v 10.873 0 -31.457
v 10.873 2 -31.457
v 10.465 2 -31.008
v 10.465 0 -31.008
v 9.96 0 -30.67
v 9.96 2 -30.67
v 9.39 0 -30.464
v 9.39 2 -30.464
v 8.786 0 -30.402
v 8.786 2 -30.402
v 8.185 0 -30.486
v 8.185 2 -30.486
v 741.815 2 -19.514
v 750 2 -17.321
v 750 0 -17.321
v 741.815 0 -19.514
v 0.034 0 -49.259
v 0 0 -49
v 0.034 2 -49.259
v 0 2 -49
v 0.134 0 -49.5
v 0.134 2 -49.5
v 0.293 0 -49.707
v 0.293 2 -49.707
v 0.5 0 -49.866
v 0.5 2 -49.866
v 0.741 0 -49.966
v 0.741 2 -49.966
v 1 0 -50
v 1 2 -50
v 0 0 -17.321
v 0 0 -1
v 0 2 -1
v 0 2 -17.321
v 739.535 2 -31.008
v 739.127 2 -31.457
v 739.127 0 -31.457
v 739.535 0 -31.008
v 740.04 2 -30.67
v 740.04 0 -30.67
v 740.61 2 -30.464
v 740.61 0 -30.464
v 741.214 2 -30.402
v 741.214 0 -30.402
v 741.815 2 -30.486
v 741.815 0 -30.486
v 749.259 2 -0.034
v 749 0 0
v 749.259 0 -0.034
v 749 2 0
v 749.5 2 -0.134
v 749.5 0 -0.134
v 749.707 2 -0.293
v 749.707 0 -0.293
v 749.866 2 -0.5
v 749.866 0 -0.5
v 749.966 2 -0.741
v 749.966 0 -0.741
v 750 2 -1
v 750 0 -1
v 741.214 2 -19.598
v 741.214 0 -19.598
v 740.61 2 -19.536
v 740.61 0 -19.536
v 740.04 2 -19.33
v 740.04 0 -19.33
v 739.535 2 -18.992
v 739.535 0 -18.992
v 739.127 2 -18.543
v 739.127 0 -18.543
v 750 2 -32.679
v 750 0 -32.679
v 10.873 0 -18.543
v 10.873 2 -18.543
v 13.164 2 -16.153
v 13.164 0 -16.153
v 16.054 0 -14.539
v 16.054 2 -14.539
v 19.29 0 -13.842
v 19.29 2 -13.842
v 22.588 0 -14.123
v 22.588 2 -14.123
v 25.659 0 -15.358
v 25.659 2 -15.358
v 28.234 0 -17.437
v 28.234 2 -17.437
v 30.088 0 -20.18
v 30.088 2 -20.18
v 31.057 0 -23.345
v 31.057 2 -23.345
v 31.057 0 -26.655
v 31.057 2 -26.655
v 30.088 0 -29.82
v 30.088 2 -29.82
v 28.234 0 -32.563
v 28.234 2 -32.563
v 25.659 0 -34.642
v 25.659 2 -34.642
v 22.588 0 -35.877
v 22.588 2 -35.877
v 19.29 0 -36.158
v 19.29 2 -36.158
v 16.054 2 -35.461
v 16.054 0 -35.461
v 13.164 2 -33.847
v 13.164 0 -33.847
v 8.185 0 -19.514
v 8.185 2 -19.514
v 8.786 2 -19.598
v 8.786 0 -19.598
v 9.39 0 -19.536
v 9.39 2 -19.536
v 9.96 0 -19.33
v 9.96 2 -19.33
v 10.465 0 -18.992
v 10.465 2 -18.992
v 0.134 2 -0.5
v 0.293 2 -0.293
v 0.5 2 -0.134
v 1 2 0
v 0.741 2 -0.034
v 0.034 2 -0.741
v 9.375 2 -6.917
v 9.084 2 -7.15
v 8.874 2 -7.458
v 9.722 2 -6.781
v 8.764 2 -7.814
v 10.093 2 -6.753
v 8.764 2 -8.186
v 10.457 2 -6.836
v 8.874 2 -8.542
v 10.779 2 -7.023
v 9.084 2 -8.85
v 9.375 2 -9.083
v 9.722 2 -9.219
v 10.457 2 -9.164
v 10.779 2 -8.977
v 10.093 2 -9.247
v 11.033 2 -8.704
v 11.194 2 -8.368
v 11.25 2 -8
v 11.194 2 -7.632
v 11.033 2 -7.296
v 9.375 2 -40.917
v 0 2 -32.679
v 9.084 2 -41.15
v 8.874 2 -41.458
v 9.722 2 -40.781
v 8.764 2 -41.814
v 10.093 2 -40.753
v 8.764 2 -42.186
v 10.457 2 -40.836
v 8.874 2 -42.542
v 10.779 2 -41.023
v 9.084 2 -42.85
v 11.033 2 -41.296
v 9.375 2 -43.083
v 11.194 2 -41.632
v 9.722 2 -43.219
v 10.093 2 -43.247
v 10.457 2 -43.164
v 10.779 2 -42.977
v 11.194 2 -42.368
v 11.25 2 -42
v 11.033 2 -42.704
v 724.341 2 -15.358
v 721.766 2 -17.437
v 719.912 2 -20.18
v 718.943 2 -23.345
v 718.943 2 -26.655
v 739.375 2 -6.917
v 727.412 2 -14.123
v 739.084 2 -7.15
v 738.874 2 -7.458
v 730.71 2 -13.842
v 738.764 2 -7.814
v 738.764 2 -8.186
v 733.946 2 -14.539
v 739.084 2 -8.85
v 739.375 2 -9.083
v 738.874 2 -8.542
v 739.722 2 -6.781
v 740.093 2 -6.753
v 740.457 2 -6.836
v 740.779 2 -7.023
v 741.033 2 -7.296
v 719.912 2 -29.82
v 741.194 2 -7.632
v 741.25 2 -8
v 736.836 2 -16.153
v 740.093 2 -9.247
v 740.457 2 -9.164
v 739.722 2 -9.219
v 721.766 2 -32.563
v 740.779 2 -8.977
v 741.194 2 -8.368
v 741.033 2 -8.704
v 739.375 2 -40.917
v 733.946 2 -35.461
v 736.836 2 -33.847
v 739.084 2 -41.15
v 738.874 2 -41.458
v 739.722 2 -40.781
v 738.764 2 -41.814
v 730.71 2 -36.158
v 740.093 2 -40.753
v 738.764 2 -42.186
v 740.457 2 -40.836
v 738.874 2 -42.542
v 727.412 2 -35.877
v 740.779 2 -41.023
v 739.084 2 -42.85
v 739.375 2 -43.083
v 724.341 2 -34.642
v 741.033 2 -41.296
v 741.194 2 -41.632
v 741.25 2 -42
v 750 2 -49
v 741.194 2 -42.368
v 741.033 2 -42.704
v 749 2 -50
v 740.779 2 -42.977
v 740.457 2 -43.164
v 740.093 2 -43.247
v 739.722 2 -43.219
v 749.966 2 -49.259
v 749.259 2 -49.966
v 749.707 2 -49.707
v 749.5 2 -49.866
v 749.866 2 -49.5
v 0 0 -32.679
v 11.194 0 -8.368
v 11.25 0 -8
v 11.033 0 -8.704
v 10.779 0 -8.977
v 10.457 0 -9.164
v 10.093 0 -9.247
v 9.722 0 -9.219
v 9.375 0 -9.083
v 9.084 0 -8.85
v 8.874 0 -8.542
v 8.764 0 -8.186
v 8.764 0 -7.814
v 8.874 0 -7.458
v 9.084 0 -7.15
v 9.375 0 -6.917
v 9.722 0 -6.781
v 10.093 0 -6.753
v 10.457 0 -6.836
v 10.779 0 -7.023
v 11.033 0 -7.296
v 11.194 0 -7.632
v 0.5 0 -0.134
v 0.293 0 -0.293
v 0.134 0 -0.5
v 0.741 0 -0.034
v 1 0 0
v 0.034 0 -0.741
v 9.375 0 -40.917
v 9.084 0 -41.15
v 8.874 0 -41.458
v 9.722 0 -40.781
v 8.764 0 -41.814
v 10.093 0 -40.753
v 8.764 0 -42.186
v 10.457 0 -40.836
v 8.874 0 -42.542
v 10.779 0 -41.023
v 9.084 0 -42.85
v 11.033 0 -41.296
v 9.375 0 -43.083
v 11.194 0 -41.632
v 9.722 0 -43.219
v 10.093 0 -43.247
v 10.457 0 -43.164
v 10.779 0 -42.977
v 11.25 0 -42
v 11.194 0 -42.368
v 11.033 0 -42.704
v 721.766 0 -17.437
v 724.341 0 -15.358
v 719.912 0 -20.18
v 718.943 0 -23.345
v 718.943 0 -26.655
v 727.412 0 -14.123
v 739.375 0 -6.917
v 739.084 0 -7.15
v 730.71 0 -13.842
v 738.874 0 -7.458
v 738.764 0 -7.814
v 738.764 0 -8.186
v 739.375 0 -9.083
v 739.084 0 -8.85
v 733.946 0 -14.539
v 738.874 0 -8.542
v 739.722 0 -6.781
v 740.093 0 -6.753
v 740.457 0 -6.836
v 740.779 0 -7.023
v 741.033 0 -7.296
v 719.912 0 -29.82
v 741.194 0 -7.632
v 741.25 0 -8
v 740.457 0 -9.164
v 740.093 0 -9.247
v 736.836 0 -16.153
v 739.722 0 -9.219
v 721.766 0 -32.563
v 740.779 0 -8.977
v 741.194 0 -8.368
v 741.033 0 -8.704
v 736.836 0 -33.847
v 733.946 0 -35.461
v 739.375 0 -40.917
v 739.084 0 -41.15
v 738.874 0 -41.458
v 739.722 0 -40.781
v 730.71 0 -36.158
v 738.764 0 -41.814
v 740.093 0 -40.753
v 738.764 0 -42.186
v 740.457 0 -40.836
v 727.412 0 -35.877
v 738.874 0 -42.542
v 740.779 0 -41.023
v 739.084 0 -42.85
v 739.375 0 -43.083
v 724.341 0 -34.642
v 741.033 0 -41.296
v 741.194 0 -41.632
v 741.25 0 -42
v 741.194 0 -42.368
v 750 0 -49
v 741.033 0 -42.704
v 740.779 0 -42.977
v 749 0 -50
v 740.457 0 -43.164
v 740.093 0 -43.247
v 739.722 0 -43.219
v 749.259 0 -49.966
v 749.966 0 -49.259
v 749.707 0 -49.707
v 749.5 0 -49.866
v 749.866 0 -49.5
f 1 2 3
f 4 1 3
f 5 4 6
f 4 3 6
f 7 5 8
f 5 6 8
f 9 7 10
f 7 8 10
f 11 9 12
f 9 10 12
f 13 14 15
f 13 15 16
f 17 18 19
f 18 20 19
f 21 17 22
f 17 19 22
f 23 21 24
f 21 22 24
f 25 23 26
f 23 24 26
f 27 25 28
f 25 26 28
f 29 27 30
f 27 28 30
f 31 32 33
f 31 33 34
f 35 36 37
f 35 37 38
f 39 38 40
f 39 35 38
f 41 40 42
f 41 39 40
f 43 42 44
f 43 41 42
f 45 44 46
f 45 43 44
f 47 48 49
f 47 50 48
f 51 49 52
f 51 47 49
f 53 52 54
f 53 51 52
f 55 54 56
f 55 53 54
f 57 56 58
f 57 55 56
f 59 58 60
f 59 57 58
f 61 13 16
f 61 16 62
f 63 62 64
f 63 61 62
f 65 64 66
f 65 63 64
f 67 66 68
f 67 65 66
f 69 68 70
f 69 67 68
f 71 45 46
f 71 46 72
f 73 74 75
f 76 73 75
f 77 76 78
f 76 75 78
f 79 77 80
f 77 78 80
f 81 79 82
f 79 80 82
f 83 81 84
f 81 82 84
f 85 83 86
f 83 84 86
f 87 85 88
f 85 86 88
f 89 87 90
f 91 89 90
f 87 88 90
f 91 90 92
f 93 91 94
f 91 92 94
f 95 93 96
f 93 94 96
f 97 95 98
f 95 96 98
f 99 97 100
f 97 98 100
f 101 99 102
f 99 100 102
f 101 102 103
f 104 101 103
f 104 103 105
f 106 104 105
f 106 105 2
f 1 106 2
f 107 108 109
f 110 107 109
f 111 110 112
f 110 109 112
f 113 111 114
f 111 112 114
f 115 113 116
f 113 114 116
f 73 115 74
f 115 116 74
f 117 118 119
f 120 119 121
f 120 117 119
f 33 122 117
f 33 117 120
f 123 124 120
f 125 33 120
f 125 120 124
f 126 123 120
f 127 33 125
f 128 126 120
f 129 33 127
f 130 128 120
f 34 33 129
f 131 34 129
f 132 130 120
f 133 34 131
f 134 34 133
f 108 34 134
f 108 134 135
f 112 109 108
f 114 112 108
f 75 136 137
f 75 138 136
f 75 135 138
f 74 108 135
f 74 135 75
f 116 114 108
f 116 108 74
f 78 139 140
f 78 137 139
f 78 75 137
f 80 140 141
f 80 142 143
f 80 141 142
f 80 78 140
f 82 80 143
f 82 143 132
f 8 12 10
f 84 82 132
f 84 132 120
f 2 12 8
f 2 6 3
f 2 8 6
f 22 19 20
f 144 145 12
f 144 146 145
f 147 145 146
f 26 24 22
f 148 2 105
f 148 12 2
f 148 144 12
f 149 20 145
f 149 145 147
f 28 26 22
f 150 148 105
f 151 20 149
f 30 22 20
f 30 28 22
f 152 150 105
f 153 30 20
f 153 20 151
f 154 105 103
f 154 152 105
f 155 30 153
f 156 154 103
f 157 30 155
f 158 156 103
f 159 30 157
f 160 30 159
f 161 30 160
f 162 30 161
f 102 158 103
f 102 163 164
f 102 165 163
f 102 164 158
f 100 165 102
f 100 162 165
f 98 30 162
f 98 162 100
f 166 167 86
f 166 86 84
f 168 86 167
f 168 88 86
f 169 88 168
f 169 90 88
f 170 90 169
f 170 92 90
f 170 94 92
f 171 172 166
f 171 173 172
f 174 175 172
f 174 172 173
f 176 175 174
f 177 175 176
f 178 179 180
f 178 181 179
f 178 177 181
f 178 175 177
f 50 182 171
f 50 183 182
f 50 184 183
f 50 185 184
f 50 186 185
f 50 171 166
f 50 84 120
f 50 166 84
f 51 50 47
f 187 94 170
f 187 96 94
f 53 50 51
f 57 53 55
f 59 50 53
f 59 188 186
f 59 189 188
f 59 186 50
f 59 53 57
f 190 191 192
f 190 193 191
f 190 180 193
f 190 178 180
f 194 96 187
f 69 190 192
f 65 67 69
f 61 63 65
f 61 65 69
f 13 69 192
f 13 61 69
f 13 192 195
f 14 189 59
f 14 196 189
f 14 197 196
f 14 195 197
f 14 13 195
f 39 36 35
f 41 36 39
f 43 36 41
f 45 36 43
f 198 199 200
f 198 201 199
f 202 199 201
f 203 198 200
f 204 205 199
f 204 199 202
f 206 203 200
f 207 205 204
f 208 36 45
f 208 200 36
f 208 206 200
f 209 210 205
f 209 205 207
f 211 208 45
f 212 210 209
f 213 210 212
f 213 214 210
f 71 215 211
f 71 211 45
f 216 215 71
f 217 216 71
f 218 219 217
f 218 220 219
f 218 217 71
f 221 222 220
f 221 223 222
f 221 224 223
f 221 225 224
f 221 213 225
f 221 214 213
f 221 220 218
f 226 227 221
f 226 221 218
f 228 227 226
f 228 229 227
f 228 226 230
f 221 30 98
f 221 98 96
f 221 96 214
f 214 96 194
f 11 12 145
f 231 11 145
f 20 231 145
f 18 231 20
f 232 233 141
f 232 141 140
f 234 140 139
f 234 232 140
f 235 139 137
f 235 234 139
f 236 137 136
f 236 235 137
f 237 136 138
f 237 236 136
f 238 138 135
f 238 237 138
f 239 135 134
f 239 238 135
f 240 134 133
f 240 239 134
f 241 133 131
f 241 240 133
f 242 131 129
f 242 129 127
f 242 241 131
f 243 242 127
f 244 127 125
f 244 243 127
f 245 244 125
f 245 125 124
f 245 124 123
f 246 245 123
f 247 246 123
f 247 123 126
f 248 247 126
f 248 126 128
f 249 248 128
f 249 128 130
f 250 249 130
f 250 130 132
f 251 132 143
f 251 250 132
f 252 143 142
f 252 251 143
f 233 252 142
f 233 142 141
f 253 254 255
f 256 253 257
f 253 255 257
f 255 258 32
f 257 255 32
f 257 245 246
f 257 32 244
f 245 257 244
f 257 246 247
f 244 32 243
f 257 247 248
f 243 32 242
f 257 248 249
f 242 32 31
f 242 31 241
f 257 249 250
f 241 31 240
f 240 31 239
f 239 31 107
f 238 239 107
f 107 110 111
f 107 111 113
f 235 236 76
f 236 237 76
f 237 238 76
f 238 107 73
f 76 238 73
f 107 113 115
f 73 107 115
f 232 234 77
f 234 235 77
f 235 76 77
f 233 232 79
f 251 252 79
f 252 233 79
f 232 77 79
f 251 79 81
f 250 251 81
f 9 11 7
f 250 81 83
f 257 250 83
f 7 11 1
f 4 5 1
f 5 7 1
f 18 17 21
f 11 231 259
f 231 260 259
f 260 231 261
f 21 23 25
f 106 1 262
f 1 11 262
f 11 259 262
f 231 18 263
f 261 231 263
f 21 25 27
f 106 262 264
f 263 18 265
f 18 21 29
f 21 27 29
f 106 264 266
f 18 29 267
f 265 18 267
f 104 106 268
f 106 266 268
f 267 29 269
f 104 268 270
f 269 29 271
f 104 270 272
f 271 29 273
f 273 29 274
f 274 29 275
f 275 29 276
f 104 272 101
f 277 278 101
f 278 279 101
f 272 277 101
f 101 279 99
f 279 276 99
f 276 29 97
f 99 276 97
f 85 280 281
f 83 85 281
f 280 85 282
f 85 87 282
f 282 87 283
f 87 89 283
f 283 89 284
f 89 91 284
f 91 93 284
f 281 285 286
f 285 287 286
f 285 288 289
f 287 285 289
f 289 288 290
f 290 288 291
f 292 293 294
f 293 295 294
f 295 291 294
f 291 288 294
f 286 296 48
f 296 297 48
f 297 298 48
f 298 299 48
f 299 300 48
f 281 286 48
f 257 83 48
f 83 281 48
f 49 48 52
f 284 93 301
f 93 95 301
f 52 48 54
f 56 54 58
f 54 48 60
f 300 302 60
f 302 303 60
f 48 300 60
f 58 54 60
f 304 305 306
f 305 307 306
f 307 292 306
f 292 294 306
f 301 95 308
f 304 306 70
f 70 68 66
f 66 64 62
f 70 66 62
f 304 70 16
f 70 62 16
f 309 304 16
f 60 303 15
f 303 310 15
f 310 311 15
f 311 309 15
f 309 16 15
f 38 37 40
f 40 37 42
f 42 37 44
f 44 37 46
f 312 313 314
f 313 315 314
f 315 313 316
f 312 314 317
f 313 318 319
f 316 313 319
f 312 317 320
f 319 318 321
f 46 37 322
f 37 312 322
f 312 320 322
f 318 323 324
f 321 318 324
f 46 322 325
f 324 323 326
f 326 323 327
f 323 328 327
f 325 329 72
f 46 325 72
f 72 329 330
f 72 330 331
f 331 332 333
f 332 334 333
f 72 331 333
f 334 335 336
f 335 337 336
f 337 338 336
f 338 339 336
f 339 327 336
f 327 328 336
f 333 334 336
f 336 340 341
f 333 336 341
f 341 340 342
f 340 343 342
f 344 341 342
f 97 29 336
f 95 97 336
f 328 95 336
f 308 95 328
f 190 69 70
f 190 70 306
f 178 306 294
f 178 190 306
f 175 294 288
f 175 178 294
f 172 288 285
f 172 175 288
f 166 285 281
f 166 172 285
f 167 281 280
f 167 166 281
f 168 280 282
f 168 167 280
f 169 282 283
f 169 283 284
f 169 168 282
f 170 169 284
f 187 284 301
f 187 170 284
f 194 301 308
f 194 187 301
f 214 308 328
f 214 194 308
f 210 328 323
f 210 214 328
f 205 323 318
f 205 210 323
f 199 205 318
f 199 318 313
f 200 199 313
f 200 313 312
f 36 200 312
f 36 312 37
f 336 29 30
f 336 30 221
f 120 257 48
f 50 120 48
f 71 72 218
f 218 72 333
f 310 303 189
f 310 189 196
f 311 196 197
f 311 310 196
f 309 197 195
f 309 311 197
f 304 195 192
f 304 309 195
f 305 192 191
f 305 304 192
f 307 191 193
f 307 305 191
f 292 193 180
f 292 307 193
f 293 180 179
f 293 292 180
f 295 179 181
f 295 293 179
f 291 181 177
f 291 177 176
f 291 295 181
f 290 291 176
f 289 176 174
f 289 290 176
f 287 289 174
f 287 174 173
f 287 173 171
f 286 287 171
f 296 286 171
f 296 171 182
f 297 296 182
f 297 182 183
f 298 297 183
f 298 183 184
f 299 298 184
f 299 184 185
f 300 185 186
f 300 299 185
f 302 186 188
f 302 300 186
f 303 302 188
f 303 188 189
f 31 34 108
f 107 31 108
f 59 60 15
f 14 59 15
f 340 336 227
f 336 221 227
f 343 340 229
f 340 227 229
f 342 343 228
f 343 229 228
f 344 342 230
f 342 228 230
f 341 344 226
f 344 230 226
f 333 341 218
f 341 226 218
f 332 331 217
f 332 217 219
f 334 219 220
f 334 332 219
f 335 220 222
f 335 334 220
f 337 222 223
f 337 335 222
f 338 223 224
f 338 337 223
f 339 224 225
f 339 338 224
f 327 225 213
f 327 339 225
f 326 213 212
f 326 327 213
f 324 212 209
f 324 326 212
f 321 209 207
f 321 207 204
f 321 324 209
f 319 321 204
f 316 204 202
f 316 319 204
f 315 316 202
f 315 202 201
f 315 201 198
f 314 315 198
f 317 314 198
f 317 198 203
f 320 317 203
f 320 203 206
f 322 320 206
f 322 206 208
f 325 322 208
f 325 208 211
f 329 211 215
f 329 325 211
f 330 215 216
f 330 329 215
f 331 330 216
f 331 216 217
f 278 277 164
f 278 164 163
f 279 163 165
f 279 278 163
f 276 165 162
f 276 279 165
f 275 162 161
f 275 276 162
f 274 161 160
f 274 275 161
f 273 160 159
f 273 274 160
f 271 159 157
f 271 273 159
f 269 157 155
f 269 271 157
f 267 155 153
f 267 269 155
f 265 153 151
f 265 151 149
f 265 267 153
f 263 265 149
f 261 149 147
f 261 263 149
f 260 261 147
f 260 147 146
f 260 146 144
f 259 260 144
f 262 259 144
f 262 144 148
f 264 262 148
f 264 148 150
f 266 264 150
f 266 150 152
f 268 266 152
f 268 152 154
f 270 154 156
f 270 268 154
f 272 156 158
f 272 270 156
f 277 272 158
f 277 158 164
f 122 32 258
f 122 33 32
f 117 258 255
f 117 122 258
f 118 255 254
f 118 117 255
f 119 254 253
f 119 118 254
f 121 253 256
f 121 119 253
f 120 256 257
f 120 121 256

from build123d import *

# Parameters (mm, degrees)
SKETCH1_W           = 750
SKETCH1_H           = 50
SKETCH1_R           = 1.25
BOSS_EXTRUDE1_DEPTH = 2
FILLET1_R           = 1
CUT_EXTRUDE1_DEPTH  = 2


with BuildPart() as part:
    # Sketch1 → Boss-Extrude1 (new body)
    with BuildSketch(Plane(origin=(0, 0, 0), x_dir=(1, 0, 0), z_dir=(0, 1, 0))):
        with Locations((375, 25)):
            Rectangle(SKETCH1_W, SKETCH1_H)
        with Locations((10, 42)):
            Circle(SKETCH1_R, mode=Mode.SUBTRACT)
        with Locations((10, 8)):
            Circle(SKETCH1_R, mode=Mode.SUBTRACT)
        with Locations((740, 8)):
            Circle(SKETCH1_R, mode=Mode.SUBTRACT)
        with Locations((740, 42)):
            Circle(SKETCH1_R, mode=Mode.SUBTRACT)
    extrude(amount=BOSS_EXTRUDE1_DEPTH)

    # Fillet1
    fillet1_edges = [part.edges().sort_by_distance(p)[0] for p in [
        (0, 1, -50),
        (750, 1, -50),
        (750, 1, 0),
        (0, 1, 0),
    ]]
    fillet(fillet1_edges, radius=FILLET1_R)

    # Sketch2 → Cut-Extrude1 (cut)
    with BuildSketch(Plane(origin=(0, 2, 0), x_dir=(1, 0, 0), z_dir=(0, 1, 0))):
        with BuildLine():
            Line((741.815018385, 30.48633271), (750, 32.679491924))
            Line((750, 32.679491924), (750, 17.320508076))
            Line((750, 17.320508076), (741.815018385, 19.51366729))
            ThreePointArc((741.815018385, 19.51366729), (740.31863757, 19.450157279), (739.127091147, 18.542739963))
            ThreePointArc((739.127091147, 18.542739963), (718.819660113, 25), (739.127091147, 31.457260037))
            ThreePointArc((739.127091147, 31.457260037), (740.31863757, 30.549842721), (741.815018385, 30.48633271))
        make_face()
        with BuildLine():
            Line((0, 32.679491924), (0, 17.320508076))
            Line((0, 17.320508076), (8.184981615, 19.51366729))
            ThreePointArc((8.184981615, 19.51366729), (9.68136243, 19.450157279), (10.872908853, 18.542739963))
            ThreePointArc((10.872908853, 18.542739963), (31.180339887, 25), (10.872908853, 31.457260037))
            ThreePointArc((10.872908853, 31.457260037), (9.68136243, 30.549842721), (8.184981615, 30.48633271))
            Line((8.184981615, 30.48633271), (0, 32.679491924))
        make_face()
    extrude(amount=-CUT_EXTRUDE1_DEPTH, mode=Mode.SUBTRACT)


solid = part.part
